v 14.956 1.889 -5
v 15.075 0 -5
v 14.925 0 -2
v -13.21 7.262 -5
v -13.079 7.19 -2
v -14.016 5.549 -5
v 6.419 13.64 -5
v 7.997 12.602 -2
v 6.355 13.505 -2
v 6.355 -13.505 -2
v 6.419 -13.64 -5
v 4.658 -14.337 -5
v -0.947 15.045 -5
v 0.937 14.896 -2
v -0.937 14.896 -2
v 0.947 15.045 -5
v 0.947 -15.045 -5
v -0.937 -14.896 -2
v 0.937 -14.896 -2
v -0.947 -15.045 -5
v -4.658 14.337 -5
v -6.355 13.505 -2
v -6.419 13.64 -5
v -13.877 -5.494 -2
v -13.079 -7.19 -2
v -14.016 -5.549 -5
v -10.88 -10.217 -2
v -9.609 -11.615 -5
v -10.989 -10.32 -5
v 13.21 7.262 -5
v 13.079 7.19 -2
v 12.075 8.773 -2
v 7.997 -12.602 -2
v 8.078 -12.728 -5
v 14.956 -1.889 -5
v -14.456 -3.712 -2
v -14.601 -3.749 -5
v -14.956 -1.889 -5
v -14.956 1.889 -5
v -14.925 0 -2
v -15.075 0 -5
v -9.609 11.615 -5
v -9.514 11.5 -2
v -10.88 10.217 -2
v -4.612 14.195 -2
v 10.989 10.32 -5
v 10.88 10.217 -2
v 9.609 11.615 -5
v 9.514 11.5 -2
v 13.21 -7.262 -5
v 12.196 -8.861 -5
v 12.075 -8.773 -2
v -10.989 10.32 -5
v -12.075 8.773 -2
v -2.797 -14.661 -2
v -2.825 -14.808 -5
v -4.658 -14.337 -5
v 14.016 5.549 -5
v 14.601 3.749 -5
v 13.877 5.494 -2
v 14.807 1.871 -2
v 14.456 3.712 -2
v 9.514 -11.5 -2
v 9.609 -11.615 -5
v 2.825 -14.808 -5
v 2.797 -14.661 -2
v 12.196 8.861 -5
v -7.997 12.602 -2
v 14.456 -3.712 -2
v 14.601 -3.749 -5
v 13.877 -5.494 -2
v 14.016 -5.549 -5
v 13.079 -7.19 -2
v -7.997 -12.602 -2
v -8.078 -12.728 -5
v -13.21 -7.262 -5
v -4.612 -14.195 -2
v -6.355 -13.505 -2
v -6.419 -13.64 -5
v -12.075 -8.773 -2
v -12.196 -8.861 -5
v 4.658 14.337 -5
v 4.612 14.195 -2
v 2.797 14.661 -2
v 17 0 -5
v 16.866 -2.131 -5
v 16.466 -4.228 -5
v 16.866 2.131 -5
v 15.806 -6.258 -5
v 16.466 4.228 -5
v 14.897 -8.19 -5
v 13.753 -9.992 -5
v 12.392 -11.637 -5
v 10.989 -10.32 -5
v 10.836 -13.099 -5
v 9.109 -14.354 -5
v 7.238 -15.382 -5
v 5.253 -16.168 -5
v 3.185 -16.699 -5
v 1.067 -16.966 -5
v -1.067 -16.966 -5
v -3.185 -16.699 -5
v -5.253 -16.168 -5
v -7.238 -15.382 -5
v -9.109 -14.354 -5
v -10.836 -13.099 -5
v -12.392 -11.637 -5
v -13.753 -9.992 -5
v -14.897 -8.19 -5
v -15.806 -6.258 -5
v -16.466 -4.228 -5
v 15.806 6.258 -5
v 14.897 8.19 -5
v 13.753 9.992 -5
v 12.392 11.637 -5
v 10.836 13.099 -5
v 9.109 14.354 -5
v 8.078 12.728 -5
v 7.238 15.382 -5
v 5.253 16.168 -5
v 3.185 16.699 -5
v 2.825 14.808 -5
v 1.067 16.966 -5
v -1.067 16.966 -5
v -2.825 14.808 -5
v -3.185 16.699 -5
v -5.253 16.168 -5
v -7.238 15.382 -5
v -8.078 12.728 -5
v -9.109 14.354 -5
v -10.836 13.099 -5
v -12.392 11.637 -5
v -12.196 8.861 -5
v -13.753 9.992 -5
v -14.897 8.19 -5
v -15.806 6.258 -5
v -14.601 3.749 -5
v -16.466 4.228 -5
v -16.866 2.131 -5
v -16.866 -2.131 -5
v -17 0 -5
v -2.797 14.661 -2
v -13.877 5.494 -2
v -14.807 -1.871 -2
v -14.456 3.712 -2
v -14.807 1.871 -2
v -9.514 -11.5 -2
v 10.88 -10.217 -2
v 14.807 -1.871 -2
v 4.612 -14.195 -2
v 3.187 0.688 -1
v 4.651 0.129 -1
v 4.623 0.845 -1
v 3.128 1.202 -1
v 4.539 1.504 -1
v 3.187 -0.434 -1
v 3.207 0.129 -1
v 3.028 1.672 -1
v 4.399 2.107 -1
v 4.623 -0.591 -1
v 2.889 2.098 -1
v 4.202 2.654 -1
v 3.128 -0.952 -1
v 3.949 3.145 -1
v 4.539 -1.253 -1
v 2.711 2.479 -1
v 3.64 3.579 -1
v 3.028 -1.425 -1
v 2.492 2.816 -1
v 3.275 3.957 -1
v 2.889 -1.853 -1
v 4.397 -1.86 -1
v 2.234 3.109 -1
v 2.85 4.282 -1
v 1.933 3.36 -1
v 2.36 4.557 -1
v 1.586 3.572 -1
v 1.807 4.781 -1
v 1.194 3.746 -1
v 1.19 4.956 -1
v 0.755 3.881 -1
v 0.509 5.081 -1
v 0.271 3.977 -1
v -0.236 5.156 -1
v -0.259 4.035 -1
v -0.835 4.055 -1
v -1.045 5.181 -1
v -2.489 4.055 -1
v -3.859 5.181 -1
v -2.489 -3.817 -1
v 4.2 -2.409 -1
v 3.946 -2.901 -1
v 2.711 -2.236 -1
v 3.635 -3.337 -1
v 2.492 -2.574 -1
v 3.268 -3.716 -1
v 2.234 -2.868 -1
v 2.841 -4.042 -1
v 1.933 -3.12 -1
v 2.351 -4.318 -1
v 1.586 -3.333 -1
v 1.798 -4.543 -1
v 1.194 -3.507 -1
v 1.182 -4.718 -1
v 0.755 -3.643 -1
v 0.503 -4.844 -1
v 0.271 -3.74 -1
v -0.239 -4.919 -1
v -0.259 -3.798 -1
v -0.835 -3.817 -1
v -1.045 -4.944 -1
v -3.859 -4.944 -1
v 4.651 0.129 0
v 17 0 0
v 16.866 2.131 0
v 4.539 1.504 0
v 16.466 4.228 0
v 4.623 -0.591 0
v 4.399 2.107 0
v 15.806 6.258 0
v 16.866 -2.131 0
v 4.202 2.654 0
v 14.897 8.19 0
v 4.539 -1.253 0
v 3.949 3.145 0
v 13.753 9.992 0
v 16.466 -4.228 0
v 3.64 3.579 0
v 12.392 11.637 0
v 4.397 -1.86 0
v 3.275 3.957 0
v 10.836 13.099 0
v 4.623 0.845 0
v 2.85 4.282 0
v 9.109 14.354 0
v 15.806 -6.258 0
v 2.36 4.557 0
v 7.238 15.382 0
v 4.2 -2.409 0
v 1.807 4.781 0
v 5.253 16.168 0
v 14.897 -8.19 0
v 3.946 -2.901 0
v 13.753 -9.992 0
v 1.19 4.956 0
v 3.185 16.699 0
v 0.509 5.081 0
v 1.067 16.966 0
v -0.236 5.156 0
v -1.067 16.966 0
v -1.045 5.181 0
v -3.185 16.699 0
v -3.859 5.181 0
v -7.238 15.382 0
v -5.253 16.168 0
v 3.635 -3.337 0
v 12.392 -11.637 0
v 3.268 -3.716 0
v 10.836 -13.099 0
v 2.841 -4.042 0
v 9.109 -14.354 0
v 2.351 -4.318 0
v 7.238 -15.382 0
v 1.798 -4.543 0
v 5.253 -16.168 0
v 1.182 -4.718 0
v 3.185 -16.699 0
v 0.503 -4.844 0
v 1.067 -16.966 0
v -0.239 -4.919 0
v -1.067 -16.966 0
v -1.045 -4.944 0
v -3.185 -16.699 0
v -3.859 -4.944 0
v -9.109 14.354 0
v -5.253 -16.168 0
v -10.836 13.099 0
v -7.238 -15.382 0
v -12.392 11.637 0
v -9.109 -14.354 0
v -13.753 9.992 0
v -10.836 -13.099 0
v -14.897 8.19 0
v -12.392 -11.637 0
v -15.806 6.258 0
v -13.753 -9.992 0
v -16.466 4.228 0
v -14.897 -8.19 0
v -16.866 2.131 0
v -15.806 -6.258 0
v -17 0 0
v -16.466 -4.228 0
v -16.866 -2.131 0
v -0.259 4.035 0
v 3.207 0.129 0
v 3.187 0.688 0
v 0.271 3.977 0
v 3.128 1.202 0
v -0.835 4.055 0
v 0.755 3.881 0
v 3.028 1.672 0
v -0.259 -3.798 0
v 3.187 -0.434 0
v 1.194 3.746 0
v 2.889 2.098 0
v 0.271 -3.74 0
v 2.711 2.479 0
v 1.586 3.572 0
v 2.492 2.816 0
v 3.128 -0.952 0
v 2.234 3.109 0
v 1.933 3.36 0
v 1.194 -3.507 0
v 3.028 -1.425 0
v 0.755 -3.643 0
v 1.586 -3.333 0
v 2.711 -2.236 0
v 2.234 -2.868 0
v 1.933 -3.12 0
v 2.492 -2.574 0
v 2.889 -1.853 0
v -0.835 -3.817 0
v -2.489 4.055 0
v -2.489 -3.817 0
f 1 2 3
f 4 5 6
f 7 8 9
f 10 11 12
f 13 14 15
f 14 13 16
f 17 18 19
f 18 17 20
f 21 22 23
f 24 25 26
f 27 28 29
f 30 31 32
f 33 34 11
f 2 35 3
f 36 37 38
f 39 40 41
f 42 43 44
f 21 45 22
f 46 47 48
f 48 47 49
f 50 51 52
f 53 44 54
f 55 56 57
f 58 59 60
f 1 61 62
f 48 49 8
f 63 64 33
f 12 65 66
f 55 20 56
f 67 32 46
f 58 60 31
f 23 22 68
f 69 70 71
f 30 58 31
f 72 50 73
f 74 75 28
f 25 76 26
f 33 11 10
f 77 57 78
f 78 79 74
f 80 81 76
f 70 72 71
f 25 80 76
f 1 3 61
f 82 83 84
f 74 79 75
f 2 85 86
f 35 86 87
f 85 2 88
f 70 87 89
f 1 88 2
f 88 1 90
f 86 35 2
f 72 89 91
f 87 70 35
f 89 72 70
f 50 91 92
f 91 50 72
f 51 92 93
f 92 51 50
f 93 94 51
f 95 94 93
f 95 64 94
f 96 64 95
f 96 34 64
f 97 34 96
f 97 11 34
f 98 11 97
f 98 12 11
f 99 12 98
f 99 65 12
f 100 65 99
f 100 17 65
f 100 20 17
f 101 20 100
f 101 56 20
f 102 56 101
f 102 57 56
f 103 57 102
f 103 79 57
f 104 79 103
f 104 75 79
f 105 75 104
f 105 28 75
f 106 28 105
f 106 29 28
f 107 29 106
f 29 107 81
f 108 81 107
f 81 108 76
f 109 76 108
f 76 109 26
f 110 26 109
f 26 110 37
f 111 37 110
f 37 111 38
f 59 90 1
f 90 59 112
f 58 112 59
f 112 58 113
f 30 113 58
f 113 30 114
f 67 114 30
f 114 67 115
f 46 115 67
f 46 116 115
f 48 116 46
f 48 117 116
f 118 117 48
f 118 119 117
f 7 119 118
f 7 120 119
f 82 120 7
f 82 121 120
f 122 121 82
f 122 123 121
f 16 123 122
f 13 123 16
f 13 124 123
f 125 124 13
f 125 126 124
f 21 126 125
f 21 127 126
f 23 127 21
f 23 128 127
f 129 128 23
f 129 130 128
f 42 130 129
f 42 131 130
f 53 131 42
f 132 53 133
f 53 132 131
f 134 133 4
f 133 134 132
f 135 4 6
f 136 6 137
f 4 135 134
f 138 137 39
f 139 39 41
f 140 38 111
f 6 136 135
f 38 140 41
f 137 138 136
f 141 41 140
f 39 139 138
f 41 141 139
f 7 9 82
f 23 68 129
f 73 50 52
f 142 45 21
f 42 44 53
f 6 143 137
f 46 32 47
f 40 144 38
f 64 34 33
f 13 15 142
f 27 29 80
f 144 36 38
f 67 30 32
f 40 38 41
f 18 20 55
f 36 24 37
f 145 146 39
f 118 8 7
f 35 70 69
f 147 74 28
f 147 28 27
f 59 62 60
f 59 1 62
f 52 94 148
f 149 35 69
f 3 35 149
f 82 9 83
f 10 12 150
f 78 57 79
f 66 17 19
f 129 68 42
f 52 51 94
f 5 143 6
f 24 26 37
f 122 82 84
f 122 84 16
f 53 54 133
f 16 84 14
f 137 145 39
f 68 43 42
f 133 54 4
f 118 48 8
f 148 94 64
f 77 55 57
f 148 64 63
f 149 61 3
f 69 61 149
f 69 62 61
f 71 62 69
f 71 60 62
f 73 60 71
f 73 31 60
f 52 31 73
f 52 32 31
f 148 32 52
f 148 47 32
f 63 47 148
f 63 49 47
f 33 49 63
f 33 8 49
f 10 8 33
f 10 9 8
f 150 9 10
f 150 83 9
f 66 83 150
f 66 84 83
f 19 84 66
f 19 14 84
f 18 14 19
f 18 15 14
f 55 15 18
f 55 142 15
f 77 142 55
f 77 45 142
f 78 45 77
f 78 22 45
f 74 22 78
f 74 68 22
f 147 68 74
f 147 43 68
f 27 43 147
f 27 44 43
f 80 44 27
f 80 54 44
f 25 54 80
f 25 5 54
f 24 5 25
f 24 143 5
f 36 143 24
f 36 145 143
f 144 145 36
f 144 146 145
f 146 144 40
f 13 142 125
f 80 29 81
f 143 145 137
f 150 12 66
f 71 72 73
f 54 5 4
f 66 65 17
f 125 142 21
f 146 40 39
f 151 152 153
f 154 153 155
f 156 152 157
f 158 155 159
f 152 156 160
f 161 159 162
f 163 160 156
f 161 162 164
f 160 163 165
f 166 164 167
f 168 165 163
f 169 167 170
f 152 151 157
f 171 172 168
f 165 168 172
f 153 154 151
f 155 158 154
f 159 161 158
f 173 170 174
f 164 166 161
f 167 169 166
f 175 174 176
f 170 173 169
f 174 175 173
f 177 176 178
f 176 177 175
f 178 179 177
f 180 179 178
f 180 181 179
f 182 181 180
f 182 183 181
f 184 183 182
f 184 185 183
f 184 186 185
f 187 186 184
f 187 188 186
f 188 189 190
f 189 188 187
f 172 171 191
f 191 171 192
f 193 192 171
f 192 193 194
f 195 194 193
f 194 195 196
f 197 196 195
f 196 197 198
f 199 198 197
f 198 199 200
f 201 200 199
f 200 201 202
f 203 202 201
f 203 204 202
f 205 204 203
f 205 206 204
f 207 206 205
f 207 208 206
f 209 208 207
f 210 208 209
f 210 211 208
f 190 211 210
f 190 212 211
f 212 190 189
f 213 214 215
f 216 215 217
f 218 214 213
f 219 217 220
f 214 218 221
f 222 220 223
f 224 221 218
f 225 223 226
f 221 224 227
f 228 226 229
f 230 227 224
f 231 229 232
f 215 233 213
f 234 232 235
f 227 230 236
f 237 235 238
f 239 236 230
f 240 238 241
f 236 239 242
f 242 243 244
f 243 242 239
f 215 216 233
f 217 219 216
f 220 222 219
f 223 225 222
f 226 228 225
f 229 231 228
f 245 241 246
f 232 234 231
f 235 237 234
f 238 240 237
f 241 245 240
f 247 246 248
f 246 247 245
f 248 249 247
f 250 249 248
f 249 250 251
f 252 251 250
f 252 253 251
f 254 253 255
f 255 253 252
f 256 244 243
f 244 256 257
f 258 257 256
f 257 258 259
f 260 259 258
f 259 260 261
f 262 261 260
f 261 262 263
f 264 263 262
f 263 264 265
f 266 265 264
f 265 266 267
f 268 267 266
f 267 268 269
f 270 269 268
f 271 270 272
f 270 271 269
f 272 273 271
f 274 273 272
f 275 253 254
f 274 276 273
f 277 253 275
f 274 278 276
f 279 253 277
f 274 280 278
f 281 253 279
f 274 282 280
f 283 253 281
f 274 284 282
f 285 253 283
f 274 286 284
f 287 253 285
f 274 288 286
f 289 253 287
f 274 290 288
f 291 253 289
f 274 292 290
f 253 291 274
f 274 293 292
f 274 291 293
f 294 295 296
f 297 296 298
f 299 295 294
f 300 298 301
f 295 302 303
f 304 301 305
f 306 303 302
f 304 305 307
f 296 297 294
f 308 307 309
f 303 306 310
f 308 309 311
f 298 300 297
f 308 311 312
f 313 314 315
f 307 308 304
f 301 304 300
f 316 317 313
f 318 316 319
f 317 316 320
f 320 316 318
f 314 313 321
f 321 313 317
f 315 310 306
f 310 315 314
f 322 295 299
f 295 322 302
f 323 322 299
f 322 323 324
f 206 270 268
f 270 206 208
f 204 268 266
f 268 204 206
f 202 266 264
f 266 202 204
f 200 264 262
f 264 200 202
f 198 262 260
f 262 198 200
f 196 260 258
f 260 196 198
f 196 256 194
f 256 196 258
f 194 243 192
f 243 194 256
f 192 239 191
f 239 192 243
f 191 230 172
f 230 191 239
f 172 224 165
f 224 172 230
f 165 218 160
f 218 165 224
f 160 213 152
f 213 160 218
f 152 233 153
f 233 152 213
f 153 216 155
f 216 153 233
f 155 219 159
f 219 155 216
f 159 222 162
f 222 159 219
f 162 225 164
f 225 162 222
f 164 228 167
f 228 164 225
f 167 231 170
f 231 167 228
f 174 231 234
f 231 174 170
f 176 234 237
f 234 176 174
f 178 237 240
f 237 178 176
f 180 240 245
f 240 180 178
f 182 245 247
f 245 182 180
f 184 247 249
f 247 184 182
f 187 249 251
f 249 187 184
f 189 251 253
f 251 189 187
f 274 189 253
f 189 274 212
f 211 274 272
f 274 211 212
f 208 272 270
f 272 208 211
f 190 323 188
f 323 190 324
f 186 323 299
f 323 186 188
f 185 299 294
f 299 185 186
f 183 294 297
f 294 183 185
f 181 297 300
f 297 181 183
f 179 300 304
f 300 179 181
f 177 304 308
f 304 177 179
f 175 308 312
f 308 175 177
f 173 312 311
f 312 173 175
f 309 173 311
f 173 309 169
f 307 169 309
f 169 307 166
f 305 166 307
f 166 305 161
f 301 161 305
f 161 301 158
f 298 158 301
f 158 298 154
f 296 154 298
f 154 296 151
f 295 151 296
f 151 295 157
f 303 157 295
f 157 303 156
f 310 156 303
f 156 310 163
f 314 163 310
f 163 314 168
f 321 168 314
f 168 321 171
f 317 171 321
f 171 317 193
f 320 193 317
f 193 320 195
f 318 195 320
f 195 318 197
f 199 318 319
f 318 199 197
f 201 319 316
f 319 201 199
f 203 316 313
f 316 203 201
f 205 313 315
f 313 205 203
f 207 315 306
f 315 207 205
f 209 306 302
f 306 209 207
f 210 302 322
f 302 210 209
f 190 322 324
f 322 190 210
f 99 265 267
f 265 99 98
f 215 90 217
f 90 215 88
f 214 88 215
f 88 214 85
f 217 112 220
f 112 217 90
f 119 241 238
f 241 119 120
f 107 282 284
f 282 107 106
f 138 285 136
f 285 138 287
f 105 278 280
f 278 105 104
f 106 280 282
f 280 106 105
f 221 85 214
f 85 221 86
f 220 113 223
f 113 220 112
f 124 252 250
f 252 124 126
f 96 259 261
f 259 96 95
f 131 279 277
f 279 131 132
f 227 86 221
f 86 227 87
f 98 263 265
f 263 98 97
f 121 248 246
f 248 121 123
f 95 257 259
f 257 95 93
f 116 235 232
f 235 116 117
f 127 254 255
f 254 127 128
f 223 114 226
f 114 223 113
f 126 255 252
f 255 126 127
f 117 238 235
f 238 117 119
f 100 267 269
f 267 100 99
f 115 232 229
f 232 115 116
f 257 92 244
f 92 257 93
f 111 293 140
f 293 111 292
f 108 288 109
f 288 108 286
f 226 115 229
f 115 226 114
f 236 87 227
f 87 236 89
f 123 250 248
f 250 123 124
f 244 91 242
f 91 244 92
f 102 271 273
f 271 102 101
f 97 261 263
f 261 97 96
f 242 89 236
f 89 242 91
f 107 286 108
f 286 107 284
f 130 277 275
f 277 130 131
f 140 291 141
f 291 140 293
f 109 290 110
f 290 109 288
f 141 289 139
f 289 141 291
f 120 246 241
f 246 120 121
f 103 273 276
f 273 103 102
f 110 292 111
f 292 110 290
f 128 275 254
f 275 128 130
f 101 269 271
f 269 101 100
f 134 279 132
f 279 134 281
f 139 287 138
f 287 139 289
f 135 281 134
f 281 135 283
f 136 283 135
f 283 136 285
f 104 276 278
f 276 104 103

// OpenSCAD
$fn = 50;


difference() {
	union() {
		translate(v = [0, 0, -5.0000000000]) {
			cylinder(h = 5, r = 17.0000000000);
		}
	}
	union() {
		#translate(v = [0, 0, -5.0000000000]) {
			cylinder(h = 3, r1 = 15.0750000000, r2 = 14.9250000000);
		}
		translate(v = [0, 0, -1]) {
			linear_extrude(height = 1) {
				text(font = "Impact", halign = "center", size = 10, text = "D", valign = "center");
			}
		}
	}
}
